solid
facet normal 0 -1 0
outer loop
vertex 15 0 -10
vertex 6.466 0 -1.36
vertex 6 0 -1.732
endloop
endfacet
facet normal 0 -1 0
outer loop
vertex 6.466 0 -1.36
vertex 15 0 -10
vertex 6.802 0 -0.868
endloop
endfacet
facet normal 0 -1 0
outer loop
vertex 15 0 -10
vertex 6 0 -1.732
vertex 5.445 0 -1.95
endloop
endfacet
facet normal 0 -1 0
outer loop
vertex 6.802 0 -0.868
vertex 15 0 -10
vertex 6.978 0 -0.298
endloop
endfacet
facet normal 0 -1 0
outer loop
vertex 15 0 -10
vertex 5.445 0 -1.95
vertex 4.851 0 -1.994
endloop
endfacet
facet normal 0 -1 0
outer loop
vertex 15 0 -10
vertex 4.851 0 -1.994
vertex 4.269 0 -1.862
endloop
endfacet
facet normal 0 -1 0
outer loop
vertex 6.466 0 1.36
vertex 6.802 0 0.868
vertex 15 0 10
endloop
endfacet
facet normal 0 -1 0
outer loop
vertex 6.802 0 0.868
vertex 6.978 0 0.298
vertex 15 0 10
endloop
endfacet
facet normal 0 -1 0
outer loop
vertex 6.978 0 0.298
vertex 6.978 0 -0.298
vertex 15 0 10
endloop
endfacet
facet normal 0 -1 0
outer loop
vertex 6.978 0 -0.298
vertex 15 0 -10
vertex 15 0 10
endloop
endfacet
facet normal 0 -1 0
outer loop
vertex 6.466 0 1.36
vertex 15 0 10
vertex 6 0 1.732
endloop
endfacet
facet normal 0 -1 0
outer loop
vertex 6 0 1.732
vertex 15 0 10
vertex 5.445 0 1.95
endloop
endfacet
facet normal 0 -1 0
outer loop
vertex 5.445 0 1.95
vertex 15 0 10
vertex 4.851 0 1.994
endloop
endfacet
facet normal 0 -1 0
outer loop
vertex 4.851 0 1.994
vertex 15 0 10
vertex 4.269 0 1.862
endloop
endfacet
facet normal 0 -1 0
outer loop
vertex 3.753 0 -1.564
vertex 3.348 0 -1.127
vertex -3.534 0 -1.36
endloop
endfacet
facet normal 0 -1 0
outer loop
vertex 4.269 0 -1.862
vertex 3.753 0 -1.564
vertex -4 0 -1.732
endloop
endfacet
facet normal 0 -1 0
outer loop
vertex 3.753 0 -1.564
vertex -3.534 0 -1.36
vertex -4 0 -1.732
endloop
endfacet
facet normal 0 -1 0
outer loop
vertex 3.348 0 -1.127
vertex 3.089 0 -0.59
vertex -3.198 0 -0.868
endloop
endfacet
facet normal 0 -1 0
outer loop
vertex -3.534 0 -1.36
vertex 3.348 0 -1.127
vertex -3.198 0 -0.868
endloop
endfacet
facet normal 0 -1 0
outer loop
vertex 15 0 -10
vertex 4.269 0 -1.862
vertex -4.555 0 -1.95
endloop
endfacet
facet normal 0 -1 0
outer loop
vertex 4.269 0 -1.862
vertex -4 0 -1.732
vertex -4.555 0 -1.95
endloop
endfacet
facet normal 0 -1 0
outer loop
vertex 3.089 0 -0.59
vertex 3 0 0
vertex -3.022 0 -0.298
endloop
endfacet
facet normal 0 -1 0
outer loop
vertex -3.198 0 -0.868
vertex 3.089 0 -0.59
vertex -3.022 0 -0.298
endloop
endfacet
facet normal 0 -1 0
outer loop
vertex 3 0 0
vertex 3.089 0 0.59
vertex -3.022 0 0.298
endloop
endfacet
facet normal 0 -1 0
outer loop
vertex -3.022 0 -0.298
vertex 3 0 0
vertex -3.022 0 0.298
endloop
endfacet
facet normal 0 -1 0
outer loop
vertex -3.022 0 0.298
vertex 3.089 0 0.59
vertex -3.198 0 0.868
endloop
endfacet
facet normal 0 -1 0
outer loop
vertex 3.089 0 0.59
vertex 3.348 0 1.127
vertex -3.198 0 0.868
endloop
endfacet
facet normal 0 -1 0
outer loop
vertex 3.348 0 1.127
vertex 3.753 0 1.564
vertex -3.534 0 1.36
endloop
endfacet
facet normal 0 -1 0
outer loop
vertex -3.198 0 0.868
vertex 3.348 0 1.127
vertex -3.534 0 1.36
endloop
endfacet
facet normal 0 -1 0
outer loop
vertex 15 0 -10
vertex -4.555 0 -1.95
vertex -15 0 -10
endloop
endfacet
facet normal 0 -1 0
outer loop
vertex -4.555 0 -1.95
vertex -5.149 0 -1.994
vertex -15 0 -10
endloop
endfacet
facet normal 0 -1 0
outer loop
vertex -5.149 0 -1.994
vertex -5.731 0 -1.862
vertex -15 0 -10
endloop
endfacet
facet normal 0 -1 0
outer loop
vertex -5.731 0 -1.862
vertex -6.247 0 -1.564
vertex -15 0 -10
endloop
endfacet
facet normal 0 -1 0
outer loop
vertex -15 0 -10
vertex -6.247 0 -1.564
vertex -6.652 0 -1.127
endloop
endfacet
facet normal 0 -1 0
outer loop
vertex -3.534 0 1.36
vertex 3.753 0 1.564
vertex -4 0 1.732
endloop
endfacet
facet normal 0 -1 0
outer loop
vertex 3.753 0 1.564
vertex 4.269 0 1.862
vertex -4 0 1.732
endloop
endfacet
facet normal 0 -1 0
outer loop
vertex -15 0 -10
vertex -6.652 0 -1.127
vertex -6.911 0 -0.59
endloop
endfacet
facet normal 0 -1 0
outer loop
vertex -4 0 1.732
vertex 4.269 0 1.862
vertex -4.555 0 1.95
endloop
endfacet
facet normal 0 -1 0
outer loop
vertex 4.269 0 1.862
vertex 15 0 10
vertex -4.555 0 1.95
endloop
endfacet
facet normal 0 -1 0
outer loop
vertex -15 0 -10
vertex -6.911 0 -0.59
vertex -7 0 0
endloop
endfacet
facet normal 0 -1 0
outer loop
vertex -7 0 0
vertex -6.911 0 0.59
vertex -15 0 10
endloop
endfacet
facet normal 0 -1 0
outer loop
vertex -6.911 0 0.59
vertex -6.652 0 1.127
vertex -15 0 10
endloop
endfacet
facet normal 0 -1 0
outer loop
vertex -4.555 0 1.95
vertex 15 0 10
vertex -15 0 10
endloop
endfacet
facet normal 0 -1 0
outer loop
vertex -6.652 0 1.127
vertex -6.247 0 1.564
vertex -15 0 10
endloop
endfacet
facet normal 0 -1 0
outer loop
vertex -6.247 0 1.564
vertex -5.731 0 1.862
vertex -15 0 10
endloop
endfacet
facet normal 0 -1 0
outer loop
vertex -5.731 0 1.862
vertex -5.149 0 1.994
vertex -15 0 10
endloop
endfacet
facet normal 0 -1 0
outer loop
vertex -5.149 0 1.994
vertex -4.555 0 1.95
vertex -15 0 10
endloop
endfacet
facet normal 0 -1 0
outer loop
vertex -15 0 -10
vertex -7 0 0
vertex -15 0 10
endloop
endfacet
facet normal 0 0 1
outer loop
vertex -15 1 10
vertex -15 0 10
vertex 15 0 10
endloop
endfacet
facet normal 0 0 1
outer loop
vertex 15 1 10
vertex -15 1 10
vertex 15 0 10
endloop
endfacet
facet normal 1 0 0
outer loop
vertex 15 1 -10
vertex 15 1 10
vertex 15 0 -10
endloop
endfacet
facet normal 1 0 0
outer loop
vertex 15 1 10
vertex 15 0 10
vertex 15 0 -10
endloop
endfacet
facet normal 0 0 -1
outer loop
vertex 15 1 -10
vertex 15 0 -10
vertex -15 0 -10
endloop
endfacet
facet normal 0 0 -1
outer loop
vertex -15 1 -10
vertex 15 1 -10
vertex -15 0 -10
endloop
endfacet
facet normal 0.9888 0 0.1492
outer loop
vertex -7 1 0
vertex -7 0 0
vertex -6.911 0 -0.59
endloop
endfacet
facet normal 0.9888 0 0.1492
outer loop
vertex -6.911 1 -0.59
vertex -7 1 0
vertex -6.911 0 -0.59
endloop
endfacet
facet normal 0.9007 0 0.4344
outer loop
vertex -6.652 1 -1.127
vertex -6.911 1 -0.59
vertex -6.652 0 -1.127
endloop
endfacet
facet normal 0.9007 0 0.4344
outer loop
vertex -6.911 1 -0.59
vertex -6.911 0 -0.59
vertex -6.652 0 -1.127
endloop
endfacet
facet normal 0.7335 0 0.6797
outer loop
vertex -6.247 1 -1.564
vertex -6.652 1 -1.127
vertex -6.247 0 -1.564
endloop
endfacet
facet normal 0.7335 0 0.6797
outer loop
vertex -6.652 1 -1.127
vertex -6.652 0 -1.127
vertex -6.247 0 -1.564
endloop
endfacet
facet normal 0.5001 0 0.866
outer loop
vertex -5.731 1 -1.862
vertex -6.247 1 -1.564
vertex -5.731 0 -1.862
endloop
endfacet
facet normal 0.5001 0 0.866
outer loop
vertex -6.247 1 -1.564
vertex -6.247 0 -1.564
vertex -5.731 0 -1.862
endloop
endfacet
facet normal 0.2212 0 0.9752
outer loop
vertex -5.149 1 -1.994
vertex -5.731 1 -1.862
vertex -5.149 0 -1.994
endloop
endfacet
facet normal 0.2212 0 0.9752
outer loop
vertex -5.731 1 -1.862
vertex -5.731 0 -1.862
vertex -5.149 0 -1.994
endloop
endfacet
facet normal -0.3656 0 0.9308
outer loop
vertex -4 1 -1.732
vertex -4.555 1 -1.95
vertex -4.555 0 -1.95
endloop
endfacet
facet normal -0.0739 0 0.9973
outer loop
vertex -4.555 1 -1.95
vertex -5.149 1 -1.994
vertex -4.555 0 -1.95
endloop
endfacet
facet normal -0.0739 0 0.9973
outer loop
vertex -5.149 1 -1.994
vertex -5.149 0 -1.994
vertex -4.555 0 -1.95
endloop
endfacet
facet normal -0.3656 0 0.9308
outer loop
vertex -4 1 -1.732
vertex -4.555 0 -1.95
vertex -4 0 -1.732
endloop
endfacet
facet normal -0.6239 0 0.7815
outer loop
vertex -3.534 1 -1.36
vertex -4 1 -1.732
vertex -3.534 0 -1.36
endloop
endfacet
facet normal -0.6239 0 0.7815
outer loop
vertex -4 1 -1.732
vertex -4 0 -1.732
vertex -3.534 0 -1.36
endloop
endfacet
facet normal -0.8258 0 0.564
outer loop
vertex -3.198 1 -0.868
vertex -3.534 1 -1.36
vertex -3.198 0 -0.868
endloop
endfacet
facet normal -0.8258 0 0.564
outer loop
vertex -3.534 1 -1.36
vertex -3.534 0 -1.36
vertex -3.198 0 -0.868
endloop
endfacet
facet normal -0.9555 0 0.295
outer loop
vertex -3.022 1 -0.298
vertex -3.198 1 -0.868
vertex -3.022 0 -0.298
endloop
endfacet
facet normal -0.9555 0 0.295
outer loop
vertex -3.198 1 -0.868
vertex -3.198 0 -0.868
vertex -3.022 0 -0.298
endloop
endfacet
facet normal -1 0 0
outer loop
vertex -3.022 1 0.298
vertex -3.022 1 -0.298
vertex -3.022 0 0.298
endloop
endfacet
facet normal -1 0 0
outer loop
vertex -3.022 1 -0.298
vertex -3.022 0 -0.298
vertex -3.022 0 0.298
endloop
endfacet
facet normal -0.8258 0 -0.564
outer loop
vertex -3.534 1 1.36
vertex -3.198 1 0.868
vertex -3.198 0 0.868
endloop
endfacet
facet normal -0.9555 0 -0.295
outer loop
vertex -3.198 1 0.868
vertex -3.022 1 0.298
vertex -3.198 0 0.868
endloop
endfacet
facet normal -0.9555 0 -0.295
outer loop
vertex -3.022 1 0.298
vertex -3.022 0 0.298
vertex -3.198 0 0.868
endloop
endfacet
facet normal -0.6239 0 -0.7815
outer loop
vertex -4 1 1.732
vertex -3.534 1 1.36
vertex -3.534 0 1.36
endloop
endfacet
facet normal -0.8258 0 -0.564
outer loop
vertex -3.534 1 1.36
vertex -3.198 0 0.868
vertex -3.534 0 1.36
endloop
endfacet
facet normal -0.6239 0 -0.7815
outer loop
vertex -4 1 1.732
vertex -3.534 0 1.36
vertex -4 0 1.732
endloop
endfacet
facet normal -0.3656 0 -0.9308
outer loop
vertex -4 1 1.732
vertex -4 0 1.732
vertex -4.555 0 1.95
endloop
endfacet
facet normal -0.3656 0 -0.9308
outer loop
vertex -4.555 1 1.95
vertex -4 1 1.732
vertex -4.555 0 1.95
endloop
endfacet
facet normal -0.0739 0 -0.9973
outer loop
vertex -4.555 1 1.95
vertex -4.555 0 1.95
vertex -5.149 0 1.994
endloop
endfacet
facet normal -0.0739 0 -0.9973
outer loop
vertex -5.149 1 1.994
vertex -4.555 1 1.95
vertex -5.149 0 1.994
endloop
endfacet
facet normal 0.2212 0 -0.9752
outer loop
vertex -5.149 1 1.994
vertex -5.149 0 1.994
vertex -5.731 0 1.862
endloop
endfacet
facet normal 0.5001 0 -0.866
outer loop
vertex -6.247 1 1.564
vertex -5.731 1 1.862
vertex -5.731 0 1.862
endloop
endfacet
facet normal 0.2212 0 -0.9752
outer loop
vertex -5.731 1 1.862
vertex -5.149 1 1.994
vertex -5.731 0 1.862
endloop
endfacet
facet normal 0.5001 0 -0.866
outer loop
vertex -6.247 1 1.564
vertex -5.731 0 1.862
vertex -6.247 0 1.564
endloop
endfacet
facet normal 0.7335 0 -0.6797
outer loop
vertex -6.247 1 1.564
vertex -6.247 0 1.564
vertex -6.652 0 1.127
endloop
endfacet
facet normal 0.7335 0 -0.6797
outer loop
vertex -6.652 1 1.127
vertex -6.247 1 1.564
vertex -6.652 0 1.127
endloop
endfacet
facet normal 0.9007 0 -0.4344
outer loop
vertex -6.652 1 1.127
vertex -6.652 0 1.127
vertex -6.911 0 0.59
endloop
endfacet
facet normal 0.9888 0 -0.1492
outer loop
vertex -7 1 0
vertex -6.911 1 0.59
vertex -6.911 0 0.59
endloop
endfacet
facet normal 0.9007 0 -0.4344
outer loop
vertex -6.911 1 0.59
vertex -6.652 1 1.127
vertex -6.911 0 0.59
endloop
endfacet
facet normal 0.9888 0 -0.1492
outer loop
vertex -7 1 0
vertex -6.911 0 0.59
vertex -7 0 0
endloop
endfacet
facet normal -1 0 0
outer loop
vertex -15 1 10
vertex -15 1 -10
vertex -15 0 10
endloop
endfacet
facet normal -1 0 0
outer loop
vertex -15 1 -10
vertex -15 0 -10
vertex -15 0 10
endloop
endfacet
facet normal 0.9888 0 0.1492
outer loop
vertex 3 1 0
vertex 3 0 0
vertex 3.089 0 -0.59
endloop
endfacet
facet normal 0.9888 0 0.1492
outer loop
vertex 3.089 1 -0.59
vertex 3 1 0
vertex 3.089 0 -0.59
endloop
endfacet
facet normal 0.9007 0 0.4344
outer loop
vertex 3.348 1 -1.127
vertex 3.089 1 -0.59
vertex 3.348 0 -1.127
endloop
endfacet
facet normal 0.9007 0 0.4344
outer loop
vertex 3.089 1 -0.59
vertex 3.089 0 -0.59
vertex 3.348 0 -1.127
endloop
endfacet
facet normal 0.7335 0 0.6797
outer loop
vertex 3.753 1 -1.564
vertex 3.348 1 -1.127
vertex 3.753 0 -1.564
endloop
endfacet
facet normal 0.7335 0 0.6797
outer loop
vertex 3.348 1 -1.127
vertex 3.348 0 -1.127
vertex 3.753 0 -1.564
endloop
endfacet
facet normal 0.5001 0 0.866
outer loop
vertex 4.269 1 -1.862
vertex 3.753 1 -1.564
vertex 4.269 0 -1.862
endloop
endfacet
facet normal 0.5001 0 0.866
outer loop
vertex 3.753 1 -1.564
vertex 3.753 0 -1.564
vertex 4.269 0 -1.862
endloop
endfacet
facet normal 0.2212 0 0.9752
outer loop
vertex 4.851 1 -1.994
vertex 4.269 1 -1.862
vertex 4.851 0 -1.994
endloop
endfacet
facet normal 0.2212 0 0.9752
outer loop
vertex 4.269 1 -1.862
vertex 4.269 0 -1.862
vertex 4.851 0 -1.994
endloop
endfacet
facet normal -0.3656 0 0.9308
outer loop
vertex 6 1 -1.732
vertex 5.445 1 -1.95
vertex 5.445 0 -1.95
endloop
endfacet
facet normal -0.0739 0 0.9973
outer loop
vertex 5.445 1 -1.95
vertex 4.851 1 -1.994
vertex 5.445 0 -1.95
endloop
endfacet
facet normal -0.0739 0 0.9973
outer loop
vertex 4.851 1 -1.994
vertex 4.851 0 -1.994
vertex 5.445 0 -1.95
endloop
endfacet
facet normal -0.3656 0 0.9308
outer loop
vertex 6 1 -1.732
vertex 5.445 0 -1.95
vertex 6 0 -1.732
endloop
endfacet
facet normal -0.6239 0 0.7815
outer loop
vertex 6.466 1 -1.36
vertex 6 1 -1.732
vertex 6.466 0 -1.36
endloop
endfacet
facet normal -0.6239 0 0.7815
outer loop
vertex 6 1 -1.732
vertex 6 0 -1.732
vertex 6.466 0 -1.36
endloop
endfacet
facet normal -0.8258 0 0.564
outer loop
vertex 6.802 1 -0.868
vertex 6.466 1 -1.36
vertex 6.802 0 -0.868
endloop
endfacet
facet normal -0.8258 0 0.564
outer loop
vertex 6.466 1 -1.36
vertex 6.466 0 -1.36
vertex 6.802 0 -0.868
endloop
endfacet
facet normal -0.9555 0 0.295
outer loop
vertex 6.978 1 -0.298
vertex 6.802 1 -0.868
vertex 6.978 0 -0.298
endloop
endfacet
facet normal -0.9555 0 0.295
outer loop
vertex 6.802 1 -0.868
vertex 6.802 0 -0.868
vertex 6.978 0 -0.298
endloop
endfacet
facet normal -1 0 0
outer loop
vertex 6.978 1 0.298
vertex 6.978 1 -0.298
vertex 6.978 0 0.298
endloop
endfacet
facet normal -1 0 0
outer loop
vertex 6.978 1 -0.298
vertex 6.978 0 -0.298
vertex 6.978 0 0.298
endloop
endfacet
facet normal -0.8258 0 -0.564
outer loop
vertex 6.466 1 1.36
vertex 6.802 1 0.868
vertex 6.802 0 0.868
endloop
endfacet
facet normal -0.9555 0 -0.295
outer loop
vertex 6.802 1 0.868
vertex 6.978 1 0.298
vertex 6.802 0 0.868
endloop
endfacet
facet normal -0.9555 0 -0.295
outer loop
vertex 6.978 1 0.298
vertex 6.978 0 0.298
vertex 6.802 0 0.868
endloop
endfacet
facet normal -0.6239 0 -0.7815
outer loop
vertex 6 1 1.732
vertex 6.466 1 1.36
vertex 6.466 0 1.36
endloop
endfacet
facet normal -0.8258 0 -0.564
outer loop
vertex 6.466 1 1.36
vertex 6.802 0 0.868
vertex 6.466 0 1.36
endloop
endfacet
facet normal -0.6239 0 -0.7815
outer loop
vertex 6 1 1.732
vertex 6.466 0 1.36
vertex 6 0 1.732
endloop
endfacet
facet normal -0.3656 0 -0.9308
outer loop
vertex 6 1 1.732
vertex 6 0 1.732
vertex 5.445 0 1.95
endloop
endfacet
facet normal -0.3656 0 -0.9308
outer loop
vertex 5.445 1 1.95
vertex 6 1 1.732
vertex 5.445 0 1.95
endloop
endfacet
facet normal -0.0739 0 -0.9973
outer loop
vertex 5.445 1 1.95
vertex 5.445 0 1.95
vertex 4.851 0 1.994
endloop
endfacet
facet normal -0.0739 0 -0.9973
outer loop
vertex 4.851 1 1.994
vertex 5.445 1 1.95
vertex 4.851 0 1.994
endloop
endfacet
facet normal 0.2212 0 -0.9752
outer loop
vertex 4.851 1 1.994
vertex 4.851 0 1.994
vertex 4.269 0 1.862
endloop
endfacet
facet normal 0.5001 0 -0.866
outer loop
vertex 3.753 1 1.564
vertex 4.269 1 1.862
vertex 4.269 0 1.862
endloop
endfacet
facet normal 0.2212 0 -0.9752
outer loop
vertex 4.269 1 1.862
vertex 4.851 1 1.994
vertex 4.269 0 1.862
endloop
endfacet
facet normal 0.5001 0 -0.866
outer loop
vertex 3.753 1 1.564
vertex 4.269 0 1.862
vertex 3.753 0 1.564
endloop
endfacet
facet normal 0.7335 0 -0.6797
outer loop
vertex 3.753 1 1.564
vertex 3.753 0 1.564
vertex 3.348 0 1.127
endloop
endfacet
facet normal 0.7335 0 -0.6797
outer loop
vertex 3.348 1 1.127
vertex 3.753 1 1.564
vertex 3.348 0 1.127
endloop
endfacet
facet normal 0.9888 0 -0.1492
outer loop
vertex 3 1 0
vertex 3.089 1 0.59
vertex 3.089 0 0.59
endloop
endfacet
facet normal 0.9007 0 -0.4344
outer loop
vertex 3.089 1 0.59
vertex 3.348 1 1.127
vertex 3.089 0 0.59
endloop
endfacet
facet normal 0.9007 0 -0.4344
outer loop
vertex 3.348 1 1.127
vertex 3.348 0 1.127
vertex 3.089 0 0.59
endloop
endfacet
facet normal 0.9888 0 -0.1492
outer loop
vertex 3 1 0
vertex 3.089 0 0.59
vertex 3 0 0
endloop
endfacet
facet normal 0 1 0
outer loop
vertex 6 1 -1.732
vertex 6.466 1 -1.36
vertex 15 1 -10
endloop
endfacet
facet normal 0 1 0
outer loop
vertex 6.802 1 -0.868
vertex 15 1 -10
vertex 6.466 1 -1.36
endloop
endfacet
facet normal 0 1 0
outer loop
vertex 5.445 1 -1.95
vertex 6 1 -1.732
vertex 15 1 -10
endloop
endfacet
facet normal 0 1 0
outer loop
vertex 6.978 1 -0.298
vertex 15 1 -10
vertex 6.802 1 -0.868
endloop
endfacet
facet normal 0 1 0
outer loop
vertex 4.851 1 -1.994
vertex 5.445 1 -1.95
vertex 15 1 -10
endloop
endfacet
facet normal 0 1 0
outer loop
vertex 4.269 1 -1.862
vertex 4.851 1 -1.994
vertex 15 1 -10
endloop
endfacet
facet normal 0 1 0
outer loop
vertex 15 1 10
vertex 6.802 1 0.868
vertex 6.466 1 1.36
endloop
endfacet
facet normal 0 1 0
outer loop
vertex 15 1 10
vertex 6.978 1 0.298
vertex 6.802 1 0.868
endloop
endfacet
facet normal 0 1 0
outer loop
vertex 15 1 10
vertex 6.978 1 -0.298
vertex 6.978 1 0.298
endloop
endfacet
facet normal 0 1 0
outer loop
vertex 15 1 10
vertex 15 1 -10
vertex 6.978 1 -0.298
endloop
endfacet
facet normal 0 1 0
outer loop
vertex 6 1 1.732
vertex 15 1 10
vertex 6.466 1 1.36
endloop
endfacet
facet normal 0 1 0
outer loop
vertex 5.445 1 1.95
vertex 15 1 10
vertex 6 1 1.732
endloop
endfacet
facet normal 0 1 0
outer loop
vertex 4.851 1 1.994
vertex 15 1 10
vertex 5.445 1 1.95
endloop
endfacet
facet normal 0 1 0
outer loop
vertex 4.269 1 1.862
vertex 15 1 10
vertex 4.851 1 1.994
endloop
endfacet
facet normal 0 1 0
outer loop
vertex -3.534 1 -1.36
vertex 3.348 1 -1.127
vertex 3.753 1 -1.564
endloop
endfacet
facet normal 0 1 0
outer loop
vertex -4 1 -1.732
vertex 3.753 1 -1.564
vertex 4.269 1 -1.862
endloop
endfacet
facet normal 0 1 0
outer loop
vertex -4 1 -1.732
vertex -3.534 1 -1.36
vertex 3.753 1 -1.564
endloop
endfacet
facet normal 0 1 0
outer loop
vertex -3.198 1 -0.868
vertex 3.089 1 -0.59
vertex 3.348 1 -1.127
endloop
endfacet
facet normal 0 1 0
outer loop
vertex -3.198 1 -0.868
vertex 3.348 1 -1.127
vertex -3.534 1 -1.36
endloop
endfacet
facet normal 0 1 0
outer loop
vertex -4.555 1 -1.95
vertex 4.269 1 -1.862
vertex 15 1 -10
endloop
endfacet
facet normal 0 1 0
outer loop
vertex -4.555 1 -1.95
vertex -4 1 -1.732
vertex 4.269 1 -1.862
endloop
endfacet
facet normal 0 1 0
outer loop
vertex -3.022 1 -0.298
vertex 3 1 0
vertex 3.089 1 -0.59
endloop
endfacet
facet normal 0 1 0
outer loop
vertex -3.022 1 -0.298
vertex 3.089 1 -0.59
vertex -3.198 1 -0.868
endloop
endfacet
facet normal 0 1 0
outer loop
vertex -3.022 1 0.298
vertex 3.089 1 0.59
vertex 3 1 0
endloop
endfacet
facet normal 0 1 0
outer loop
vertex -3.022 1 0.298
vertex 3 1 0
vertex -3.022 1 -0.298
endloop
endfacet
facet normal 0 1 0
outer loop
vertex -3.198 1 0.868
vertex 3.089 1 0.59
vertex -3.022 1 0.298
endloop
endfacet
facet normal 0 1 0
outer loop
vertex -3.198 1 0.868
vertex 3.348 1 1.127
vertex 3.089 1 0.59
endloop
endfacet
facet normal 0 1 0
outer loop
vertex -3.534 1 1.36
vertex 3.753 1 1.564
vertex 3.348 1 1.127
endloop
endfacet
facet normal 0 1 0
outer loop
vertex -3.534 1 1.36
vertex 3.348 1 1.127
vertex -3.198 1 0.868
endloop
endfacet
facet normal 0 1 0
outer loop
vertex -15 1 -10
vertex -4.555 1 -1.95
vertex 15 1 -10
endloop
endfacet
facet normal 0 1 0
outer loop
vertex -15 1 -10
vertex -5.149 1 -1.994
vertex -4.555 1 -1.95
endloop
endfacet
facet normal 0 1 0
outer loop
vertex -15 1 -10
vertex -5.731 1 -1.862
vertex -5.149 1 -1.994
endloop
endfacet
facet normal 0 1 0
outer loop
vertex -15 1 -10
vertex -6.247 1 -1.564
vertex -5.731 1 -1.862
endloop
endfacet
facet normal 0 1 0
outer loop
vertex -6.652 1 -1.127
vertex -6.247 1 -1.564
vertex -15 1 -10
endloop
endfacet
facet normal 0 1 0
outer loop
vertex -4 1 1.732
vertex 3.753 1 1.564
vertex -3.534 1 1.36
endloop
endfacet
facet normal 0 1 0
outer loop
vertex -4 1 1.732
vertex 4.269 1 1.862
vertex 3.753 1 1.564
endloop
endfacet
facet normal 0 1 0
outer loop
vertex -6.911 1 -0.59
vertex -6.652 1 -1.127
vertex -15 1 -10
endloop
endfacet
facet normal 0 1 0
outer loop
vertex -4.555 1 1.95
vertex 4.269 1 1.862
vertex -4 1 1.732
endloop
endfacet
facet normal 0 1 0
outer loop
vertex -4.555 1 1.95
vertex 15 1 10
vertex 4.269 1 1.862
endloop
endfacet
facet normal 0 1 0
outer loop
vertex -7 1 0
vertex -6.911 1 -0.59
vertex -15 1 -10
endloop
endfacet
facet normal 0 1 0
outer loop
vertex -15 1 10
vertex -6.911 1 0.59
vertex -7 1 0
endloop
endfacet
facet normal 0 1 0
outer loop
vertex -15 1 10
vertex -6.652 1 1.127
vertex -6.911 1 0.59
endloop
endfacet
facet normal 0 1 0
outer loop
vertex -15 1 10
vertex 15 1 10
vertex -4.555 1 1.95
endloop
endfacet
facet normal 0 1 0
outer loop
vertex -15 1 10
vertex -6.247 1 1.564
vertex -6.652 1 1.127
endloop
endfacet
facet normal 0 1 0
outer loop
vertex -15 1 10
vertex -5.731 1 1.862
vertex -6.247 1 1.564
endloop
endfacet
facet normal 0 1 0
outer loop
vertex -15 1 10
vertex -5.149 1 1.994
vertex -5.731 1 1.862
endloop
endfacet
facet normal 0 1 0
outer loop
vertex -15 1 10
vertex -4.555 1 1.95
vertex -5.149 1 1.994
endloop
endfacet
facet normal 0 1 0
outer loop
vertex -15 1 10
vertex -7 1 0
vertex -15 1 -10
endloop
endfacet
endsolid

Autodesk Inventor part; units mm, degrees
ref_plane "YZ Plane" through (0, 0, 0) normal (1, 0, 0) x (0, 1, 0)
ref_plane "XZ Plane" through (0, 0, 0) normal (0, 1, 0) x (-1, 0, 0)
ref_plane "XY Plane" through (0, 0, 0) normal (0, 0, 1) x (1, 0, 0)
sketch "Sketch1" plane through (0, 0, 0) normal (0, 1, 0) x (-1, 0, 0)
  line L0 (-15, -10) -> (15, -10)
  line L1 (15, -10) -> (15, 10)
  line L2 (15, 10) -> (-15, 10)
  line L3 (-15, 10) -> (-15, -10)
  line L4 (-15, -10) -> (15, 10) construction
  line L5 (15, -10) -> (-15, 10) construction
  circle A0 centre (5, 0) radius 2
  circle A1 centre (-5, 0) radius 2
  point P0 (0, 0)
  dimension "d0" = 30
  dimension "d1" = 20
  dimension "d2" = 4
  dimension "d3" = 4
extrude "Extrusion1" add sketch "Sketch1" along normal blind 1
properties part number "trail 10"
